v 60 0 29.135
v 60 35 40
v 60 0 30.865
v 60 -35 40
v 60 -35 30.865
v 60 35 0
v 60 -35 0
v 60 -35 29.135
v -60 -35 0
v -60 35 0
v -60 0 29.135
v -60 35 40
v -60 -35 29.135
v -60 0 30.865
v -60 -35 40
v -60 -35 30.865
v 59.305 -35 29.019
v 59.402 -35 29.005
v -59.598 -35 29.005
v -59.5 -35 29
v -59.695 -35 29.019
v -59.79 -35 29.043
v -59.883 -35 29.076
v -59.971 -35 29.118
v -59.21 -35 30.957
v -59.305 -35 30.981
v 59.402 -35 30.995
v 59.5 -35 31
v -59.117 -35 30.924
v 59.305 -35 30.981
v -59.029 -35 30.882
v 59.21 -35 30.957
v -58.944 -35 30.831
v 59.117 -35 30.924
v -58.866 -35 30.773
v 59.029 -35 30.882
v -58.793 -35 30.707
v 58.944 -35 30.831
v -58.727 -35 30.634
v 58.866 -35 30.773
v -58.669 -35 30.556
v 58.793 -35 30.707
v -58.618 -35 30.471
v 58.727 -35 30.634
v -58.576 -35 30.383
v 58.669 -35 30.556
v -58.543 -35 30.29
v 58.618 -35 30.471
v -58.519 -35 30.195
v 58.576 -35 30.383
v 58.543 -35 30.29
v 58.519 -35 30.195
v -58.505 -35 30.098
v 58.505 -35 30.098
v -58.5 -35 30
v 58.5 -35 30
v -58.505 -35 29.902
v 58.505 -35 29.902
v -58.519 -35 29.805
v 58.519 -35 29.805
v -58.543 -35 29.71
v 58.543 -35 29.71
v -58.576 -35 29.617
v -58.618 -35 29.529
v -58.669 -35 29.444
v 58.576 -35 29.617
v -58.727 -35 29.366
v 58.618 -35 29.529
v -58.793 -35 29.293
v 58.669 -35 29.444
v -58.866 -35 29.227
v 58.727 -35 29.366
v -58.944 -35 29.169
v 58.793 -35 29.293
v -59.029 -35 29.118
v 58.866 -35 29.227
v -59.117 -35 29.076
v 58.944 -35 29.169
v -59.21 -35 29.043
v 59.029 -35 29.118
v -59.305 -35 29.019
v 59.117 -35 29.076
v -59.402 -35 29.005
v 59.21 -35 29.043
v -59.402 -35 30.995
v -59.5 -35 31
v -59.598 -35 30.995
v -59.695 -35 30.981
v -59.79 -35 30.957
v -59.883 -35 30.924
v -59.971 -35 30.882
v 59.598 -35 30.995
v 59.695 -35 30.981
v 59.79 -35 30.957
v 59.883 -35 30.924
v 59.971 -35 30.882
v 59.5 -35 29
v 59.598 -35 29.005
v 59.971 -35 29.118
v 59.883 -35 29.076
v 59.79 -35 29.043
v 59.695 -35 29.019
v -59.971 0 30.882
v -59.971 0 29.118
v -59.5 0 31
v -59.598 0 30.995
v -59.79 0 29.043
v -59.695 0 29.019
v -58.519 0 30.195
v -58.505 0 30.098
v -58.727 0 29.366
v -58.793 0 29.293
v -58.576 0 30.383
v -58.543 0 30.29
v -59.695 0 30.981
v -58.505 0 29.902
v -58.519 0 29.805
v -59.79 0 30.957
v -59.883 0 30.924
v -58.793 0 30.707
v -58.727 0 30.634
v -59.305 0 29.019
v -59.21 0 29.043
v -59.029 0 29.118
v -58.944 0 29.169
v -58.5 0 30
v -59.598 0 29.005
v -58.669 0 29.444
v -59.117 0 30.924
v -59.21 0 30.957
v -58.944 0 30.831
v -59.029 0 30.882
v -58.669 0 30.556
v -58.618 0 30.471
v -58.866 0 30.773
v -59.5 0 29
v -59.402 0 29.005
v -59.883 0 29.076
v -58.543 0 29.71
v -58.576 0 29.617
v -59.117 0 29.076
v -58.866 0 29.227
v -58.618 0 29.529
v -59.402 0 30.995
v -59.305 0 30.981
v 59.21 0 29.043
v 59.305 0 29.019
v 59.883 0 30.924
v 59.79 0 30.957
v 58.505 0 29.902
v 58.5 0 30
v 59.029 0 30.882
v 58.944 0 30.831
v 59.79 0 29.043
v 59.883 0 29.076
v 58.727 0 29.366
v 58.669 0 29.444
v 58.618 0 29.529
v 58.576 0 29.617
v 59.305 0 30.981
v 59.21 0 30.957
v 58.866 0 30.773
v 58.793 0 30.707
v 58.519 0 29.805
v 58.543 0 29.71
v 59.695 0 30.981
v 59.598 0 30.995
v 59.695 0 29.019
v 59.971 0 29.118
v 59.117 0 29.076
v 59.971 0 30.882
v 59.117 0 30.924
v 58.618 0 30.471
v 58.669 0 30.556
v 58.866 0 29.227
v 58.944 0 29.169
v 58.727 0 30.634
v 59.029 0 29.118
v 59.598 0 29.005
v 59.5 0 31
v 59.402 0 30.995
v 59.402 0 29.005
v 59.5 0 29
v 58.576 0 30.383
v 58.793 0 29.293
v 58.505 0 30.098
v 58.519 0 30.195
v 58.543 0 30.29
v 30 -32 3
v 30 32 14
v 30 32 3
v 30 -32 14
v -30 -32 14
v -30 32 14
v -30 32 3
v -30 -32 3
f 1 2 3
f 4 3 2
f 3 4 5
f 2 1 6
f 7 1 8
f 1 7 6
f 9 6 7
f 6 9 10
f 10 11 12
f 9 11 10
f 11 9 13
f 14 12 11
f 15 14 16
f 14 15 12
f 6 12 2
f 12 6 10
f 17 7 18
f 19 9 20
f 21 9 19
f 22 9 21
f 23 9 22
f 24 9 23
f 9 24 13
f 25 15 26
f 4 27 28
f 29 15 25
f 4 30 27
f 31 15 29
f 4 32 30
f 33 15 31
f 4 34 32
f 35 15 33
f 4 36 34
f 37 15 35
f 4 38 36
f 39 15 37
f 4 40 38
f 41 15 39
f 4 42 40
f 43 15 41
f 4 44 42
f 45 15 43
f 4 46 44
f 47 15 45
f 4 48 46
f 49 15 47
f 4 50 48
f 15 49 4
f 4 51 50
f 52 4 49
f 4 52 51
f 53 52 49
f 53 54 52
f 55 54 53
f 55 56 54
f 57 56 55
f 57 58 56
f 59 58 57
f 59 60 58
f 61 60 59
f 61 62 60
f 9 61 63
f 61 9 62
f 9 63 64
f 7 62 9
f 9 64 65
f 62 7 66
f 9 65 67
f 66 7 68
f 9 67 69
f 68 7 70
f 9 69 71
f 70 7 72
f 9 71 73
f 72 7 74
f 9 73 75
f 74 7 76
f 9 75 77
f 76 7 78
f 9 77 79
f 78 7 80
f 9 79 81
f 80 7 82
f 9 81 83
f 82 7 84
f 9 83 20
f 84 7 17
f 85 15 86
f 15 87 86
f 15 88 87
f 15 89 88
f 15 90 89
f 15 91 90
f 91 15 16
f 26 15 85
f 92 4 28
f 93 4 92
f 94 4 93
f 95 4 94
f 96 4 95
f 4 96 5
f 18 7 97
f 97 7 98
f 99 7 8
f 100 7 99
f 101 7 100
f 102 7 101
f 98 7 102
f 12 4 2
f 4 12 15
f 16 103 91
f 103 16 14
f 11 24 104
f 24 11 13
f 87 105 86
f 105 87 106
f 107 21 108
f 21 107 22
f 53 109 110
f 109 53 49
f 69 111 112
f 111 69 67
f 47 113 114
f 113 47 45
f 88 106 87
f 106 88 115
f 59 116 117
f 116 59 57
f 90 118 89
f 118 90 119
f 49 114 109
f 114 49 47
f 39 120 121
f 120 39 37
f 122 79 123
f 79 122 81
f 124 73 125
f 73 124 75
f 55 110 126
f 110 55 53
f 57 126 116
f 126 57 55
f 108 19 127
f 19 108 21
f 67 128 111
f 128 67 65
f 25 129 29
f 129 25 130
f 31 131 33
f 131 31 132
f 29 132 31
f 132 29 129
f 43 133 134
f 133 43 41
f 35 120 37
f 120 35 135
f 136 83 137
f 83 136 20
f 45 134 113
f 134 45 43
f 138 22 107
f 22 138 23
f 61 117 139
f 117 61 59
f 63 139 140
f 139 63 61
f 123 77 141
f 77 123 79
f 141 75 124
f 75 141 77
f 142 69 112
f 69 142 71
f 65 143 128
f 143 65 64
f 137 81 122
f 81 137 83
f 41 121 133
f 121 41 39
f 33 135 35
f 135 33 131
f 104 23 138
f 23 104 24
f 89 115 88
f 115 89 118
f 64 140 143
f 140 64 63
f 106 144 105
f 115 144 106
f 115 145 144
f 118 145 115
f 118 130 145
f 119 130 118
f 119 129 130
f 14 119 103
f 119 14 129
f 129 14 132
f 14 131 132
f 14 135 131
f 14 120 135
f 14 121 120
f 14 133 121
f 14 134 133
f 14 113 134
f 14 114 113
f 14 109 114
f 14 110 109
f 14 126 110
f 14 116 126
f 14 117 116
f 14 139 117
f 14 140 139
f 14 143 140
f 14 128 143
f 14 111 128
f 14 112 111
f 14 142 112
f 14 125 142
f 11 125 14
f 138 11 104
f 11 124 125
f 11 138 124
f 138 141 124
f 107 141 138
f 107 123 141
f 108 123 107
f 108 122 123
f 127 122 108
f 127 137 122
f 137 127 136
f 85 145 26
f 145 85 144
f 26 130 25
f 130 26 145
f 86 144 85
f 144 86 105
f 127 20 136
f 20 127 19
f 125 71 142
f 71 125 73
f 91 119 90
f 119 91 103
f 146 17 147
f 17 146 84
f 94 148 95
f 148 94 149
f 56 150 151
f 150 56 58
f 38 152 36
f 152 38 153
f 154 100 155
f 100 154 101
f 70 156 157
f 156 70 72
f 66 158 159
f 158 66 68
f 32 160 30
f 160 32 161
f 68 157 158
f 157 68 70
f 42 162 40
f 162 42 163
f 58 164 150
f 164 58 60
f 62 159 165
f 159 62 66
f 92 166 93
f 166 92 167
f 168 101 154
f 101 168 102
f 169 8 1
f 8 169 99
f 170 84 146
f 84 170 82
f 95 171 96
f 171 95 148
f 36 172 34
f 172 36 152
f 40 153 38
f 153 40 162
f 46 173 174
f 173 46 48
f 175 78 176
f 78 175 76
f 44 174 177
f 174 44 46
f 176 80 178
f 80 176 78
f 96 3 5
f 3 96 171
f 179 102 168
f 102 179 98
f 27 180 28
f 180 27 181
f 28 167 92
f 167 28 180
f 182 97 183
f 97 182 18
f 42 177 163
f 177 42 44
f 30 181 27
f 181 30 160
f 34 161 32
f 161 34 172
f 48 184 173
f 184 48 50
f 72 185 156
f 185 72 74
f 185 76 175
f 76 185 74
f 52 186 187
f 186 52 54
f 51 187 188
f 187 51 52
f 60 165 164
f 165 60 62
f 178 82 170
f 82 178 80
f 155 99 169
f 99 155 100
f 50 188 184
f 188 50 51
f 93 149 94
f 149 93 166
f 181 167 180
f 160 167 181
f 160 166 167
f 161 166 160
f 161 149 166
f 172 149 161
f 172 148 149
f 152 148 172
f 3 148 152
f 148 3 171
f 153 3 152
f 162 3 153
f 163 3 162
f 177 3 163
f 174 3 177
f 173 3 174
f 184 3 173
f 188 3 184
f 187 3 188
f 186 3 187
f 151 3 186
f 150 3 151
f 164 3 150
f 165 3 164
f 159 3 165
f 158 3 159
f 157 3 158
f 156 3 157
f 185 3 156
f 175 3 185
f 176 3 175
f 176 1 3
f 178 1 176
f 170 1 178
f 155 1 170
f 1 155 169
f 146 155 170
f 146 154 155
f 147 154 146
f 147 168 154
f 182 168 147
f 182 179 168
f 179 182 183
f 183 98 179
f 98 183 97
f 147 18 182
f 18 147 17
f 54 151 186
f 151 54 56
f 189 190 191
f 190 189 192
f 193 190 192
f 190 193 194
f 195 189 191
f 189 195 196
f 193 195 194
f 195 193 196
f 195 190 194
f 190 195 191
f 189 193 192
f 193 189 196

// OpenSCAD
// Mini horizontal gel-electrophoresis box - buffer tank
// Print orientation: base on XY plane, open top facing +Z

// ---- Tank dimensions ----
outer_x = 120;   // outer length in X
outer_y = 70;    // outer width in Y
height  = 40;    // overall height in Z
wall    = 3;     // wall thickness
floor   = 3;     // floor thickness (bottom solid)

// ---- Platform dimensions ----
plat_len   = 60; // platform length in X (centred)
plat_w     = outer_y - 2*wall; // platform spans full inner width
plat_top_z = 13; // top of platform (inner floor + 10 mm)

// ---- Electrode holes ----
hole_d     = 2;  // hole diameter
hole_y     = 0;  // hole Y position
hole_z     = 30; // hole Z position
eps        = 0.5; // cutter overshoot

$fn = 64;

difference() {
    // Tank body
    union() {
        // Floor
        translate([-outer_x/2, -outer_y/2, 0])
            cube([outer_x, outer_y, floor]);
        // Walls (empty interior)
        translate([-outer_x/2, -outer_y/2, floor])
            cube([outer_x, outer_y, height - floor]);
    }

    // Raised platform
    translate([-plat_len/2, -plat_w/2, floor])
        cube([plat_len, plat_w, plat_top_z - floor + 1]); // overlaps floor for a clean union

    // Electrode holes through end walls
    for (sx = [-1, 1])
        translate([sx * (outer_x/2 - eps), hole_y, hole_z])
            rotate([90, 0, 0])
                cylinder(d = hole_d, h = outer_y + 2*eps);
}
